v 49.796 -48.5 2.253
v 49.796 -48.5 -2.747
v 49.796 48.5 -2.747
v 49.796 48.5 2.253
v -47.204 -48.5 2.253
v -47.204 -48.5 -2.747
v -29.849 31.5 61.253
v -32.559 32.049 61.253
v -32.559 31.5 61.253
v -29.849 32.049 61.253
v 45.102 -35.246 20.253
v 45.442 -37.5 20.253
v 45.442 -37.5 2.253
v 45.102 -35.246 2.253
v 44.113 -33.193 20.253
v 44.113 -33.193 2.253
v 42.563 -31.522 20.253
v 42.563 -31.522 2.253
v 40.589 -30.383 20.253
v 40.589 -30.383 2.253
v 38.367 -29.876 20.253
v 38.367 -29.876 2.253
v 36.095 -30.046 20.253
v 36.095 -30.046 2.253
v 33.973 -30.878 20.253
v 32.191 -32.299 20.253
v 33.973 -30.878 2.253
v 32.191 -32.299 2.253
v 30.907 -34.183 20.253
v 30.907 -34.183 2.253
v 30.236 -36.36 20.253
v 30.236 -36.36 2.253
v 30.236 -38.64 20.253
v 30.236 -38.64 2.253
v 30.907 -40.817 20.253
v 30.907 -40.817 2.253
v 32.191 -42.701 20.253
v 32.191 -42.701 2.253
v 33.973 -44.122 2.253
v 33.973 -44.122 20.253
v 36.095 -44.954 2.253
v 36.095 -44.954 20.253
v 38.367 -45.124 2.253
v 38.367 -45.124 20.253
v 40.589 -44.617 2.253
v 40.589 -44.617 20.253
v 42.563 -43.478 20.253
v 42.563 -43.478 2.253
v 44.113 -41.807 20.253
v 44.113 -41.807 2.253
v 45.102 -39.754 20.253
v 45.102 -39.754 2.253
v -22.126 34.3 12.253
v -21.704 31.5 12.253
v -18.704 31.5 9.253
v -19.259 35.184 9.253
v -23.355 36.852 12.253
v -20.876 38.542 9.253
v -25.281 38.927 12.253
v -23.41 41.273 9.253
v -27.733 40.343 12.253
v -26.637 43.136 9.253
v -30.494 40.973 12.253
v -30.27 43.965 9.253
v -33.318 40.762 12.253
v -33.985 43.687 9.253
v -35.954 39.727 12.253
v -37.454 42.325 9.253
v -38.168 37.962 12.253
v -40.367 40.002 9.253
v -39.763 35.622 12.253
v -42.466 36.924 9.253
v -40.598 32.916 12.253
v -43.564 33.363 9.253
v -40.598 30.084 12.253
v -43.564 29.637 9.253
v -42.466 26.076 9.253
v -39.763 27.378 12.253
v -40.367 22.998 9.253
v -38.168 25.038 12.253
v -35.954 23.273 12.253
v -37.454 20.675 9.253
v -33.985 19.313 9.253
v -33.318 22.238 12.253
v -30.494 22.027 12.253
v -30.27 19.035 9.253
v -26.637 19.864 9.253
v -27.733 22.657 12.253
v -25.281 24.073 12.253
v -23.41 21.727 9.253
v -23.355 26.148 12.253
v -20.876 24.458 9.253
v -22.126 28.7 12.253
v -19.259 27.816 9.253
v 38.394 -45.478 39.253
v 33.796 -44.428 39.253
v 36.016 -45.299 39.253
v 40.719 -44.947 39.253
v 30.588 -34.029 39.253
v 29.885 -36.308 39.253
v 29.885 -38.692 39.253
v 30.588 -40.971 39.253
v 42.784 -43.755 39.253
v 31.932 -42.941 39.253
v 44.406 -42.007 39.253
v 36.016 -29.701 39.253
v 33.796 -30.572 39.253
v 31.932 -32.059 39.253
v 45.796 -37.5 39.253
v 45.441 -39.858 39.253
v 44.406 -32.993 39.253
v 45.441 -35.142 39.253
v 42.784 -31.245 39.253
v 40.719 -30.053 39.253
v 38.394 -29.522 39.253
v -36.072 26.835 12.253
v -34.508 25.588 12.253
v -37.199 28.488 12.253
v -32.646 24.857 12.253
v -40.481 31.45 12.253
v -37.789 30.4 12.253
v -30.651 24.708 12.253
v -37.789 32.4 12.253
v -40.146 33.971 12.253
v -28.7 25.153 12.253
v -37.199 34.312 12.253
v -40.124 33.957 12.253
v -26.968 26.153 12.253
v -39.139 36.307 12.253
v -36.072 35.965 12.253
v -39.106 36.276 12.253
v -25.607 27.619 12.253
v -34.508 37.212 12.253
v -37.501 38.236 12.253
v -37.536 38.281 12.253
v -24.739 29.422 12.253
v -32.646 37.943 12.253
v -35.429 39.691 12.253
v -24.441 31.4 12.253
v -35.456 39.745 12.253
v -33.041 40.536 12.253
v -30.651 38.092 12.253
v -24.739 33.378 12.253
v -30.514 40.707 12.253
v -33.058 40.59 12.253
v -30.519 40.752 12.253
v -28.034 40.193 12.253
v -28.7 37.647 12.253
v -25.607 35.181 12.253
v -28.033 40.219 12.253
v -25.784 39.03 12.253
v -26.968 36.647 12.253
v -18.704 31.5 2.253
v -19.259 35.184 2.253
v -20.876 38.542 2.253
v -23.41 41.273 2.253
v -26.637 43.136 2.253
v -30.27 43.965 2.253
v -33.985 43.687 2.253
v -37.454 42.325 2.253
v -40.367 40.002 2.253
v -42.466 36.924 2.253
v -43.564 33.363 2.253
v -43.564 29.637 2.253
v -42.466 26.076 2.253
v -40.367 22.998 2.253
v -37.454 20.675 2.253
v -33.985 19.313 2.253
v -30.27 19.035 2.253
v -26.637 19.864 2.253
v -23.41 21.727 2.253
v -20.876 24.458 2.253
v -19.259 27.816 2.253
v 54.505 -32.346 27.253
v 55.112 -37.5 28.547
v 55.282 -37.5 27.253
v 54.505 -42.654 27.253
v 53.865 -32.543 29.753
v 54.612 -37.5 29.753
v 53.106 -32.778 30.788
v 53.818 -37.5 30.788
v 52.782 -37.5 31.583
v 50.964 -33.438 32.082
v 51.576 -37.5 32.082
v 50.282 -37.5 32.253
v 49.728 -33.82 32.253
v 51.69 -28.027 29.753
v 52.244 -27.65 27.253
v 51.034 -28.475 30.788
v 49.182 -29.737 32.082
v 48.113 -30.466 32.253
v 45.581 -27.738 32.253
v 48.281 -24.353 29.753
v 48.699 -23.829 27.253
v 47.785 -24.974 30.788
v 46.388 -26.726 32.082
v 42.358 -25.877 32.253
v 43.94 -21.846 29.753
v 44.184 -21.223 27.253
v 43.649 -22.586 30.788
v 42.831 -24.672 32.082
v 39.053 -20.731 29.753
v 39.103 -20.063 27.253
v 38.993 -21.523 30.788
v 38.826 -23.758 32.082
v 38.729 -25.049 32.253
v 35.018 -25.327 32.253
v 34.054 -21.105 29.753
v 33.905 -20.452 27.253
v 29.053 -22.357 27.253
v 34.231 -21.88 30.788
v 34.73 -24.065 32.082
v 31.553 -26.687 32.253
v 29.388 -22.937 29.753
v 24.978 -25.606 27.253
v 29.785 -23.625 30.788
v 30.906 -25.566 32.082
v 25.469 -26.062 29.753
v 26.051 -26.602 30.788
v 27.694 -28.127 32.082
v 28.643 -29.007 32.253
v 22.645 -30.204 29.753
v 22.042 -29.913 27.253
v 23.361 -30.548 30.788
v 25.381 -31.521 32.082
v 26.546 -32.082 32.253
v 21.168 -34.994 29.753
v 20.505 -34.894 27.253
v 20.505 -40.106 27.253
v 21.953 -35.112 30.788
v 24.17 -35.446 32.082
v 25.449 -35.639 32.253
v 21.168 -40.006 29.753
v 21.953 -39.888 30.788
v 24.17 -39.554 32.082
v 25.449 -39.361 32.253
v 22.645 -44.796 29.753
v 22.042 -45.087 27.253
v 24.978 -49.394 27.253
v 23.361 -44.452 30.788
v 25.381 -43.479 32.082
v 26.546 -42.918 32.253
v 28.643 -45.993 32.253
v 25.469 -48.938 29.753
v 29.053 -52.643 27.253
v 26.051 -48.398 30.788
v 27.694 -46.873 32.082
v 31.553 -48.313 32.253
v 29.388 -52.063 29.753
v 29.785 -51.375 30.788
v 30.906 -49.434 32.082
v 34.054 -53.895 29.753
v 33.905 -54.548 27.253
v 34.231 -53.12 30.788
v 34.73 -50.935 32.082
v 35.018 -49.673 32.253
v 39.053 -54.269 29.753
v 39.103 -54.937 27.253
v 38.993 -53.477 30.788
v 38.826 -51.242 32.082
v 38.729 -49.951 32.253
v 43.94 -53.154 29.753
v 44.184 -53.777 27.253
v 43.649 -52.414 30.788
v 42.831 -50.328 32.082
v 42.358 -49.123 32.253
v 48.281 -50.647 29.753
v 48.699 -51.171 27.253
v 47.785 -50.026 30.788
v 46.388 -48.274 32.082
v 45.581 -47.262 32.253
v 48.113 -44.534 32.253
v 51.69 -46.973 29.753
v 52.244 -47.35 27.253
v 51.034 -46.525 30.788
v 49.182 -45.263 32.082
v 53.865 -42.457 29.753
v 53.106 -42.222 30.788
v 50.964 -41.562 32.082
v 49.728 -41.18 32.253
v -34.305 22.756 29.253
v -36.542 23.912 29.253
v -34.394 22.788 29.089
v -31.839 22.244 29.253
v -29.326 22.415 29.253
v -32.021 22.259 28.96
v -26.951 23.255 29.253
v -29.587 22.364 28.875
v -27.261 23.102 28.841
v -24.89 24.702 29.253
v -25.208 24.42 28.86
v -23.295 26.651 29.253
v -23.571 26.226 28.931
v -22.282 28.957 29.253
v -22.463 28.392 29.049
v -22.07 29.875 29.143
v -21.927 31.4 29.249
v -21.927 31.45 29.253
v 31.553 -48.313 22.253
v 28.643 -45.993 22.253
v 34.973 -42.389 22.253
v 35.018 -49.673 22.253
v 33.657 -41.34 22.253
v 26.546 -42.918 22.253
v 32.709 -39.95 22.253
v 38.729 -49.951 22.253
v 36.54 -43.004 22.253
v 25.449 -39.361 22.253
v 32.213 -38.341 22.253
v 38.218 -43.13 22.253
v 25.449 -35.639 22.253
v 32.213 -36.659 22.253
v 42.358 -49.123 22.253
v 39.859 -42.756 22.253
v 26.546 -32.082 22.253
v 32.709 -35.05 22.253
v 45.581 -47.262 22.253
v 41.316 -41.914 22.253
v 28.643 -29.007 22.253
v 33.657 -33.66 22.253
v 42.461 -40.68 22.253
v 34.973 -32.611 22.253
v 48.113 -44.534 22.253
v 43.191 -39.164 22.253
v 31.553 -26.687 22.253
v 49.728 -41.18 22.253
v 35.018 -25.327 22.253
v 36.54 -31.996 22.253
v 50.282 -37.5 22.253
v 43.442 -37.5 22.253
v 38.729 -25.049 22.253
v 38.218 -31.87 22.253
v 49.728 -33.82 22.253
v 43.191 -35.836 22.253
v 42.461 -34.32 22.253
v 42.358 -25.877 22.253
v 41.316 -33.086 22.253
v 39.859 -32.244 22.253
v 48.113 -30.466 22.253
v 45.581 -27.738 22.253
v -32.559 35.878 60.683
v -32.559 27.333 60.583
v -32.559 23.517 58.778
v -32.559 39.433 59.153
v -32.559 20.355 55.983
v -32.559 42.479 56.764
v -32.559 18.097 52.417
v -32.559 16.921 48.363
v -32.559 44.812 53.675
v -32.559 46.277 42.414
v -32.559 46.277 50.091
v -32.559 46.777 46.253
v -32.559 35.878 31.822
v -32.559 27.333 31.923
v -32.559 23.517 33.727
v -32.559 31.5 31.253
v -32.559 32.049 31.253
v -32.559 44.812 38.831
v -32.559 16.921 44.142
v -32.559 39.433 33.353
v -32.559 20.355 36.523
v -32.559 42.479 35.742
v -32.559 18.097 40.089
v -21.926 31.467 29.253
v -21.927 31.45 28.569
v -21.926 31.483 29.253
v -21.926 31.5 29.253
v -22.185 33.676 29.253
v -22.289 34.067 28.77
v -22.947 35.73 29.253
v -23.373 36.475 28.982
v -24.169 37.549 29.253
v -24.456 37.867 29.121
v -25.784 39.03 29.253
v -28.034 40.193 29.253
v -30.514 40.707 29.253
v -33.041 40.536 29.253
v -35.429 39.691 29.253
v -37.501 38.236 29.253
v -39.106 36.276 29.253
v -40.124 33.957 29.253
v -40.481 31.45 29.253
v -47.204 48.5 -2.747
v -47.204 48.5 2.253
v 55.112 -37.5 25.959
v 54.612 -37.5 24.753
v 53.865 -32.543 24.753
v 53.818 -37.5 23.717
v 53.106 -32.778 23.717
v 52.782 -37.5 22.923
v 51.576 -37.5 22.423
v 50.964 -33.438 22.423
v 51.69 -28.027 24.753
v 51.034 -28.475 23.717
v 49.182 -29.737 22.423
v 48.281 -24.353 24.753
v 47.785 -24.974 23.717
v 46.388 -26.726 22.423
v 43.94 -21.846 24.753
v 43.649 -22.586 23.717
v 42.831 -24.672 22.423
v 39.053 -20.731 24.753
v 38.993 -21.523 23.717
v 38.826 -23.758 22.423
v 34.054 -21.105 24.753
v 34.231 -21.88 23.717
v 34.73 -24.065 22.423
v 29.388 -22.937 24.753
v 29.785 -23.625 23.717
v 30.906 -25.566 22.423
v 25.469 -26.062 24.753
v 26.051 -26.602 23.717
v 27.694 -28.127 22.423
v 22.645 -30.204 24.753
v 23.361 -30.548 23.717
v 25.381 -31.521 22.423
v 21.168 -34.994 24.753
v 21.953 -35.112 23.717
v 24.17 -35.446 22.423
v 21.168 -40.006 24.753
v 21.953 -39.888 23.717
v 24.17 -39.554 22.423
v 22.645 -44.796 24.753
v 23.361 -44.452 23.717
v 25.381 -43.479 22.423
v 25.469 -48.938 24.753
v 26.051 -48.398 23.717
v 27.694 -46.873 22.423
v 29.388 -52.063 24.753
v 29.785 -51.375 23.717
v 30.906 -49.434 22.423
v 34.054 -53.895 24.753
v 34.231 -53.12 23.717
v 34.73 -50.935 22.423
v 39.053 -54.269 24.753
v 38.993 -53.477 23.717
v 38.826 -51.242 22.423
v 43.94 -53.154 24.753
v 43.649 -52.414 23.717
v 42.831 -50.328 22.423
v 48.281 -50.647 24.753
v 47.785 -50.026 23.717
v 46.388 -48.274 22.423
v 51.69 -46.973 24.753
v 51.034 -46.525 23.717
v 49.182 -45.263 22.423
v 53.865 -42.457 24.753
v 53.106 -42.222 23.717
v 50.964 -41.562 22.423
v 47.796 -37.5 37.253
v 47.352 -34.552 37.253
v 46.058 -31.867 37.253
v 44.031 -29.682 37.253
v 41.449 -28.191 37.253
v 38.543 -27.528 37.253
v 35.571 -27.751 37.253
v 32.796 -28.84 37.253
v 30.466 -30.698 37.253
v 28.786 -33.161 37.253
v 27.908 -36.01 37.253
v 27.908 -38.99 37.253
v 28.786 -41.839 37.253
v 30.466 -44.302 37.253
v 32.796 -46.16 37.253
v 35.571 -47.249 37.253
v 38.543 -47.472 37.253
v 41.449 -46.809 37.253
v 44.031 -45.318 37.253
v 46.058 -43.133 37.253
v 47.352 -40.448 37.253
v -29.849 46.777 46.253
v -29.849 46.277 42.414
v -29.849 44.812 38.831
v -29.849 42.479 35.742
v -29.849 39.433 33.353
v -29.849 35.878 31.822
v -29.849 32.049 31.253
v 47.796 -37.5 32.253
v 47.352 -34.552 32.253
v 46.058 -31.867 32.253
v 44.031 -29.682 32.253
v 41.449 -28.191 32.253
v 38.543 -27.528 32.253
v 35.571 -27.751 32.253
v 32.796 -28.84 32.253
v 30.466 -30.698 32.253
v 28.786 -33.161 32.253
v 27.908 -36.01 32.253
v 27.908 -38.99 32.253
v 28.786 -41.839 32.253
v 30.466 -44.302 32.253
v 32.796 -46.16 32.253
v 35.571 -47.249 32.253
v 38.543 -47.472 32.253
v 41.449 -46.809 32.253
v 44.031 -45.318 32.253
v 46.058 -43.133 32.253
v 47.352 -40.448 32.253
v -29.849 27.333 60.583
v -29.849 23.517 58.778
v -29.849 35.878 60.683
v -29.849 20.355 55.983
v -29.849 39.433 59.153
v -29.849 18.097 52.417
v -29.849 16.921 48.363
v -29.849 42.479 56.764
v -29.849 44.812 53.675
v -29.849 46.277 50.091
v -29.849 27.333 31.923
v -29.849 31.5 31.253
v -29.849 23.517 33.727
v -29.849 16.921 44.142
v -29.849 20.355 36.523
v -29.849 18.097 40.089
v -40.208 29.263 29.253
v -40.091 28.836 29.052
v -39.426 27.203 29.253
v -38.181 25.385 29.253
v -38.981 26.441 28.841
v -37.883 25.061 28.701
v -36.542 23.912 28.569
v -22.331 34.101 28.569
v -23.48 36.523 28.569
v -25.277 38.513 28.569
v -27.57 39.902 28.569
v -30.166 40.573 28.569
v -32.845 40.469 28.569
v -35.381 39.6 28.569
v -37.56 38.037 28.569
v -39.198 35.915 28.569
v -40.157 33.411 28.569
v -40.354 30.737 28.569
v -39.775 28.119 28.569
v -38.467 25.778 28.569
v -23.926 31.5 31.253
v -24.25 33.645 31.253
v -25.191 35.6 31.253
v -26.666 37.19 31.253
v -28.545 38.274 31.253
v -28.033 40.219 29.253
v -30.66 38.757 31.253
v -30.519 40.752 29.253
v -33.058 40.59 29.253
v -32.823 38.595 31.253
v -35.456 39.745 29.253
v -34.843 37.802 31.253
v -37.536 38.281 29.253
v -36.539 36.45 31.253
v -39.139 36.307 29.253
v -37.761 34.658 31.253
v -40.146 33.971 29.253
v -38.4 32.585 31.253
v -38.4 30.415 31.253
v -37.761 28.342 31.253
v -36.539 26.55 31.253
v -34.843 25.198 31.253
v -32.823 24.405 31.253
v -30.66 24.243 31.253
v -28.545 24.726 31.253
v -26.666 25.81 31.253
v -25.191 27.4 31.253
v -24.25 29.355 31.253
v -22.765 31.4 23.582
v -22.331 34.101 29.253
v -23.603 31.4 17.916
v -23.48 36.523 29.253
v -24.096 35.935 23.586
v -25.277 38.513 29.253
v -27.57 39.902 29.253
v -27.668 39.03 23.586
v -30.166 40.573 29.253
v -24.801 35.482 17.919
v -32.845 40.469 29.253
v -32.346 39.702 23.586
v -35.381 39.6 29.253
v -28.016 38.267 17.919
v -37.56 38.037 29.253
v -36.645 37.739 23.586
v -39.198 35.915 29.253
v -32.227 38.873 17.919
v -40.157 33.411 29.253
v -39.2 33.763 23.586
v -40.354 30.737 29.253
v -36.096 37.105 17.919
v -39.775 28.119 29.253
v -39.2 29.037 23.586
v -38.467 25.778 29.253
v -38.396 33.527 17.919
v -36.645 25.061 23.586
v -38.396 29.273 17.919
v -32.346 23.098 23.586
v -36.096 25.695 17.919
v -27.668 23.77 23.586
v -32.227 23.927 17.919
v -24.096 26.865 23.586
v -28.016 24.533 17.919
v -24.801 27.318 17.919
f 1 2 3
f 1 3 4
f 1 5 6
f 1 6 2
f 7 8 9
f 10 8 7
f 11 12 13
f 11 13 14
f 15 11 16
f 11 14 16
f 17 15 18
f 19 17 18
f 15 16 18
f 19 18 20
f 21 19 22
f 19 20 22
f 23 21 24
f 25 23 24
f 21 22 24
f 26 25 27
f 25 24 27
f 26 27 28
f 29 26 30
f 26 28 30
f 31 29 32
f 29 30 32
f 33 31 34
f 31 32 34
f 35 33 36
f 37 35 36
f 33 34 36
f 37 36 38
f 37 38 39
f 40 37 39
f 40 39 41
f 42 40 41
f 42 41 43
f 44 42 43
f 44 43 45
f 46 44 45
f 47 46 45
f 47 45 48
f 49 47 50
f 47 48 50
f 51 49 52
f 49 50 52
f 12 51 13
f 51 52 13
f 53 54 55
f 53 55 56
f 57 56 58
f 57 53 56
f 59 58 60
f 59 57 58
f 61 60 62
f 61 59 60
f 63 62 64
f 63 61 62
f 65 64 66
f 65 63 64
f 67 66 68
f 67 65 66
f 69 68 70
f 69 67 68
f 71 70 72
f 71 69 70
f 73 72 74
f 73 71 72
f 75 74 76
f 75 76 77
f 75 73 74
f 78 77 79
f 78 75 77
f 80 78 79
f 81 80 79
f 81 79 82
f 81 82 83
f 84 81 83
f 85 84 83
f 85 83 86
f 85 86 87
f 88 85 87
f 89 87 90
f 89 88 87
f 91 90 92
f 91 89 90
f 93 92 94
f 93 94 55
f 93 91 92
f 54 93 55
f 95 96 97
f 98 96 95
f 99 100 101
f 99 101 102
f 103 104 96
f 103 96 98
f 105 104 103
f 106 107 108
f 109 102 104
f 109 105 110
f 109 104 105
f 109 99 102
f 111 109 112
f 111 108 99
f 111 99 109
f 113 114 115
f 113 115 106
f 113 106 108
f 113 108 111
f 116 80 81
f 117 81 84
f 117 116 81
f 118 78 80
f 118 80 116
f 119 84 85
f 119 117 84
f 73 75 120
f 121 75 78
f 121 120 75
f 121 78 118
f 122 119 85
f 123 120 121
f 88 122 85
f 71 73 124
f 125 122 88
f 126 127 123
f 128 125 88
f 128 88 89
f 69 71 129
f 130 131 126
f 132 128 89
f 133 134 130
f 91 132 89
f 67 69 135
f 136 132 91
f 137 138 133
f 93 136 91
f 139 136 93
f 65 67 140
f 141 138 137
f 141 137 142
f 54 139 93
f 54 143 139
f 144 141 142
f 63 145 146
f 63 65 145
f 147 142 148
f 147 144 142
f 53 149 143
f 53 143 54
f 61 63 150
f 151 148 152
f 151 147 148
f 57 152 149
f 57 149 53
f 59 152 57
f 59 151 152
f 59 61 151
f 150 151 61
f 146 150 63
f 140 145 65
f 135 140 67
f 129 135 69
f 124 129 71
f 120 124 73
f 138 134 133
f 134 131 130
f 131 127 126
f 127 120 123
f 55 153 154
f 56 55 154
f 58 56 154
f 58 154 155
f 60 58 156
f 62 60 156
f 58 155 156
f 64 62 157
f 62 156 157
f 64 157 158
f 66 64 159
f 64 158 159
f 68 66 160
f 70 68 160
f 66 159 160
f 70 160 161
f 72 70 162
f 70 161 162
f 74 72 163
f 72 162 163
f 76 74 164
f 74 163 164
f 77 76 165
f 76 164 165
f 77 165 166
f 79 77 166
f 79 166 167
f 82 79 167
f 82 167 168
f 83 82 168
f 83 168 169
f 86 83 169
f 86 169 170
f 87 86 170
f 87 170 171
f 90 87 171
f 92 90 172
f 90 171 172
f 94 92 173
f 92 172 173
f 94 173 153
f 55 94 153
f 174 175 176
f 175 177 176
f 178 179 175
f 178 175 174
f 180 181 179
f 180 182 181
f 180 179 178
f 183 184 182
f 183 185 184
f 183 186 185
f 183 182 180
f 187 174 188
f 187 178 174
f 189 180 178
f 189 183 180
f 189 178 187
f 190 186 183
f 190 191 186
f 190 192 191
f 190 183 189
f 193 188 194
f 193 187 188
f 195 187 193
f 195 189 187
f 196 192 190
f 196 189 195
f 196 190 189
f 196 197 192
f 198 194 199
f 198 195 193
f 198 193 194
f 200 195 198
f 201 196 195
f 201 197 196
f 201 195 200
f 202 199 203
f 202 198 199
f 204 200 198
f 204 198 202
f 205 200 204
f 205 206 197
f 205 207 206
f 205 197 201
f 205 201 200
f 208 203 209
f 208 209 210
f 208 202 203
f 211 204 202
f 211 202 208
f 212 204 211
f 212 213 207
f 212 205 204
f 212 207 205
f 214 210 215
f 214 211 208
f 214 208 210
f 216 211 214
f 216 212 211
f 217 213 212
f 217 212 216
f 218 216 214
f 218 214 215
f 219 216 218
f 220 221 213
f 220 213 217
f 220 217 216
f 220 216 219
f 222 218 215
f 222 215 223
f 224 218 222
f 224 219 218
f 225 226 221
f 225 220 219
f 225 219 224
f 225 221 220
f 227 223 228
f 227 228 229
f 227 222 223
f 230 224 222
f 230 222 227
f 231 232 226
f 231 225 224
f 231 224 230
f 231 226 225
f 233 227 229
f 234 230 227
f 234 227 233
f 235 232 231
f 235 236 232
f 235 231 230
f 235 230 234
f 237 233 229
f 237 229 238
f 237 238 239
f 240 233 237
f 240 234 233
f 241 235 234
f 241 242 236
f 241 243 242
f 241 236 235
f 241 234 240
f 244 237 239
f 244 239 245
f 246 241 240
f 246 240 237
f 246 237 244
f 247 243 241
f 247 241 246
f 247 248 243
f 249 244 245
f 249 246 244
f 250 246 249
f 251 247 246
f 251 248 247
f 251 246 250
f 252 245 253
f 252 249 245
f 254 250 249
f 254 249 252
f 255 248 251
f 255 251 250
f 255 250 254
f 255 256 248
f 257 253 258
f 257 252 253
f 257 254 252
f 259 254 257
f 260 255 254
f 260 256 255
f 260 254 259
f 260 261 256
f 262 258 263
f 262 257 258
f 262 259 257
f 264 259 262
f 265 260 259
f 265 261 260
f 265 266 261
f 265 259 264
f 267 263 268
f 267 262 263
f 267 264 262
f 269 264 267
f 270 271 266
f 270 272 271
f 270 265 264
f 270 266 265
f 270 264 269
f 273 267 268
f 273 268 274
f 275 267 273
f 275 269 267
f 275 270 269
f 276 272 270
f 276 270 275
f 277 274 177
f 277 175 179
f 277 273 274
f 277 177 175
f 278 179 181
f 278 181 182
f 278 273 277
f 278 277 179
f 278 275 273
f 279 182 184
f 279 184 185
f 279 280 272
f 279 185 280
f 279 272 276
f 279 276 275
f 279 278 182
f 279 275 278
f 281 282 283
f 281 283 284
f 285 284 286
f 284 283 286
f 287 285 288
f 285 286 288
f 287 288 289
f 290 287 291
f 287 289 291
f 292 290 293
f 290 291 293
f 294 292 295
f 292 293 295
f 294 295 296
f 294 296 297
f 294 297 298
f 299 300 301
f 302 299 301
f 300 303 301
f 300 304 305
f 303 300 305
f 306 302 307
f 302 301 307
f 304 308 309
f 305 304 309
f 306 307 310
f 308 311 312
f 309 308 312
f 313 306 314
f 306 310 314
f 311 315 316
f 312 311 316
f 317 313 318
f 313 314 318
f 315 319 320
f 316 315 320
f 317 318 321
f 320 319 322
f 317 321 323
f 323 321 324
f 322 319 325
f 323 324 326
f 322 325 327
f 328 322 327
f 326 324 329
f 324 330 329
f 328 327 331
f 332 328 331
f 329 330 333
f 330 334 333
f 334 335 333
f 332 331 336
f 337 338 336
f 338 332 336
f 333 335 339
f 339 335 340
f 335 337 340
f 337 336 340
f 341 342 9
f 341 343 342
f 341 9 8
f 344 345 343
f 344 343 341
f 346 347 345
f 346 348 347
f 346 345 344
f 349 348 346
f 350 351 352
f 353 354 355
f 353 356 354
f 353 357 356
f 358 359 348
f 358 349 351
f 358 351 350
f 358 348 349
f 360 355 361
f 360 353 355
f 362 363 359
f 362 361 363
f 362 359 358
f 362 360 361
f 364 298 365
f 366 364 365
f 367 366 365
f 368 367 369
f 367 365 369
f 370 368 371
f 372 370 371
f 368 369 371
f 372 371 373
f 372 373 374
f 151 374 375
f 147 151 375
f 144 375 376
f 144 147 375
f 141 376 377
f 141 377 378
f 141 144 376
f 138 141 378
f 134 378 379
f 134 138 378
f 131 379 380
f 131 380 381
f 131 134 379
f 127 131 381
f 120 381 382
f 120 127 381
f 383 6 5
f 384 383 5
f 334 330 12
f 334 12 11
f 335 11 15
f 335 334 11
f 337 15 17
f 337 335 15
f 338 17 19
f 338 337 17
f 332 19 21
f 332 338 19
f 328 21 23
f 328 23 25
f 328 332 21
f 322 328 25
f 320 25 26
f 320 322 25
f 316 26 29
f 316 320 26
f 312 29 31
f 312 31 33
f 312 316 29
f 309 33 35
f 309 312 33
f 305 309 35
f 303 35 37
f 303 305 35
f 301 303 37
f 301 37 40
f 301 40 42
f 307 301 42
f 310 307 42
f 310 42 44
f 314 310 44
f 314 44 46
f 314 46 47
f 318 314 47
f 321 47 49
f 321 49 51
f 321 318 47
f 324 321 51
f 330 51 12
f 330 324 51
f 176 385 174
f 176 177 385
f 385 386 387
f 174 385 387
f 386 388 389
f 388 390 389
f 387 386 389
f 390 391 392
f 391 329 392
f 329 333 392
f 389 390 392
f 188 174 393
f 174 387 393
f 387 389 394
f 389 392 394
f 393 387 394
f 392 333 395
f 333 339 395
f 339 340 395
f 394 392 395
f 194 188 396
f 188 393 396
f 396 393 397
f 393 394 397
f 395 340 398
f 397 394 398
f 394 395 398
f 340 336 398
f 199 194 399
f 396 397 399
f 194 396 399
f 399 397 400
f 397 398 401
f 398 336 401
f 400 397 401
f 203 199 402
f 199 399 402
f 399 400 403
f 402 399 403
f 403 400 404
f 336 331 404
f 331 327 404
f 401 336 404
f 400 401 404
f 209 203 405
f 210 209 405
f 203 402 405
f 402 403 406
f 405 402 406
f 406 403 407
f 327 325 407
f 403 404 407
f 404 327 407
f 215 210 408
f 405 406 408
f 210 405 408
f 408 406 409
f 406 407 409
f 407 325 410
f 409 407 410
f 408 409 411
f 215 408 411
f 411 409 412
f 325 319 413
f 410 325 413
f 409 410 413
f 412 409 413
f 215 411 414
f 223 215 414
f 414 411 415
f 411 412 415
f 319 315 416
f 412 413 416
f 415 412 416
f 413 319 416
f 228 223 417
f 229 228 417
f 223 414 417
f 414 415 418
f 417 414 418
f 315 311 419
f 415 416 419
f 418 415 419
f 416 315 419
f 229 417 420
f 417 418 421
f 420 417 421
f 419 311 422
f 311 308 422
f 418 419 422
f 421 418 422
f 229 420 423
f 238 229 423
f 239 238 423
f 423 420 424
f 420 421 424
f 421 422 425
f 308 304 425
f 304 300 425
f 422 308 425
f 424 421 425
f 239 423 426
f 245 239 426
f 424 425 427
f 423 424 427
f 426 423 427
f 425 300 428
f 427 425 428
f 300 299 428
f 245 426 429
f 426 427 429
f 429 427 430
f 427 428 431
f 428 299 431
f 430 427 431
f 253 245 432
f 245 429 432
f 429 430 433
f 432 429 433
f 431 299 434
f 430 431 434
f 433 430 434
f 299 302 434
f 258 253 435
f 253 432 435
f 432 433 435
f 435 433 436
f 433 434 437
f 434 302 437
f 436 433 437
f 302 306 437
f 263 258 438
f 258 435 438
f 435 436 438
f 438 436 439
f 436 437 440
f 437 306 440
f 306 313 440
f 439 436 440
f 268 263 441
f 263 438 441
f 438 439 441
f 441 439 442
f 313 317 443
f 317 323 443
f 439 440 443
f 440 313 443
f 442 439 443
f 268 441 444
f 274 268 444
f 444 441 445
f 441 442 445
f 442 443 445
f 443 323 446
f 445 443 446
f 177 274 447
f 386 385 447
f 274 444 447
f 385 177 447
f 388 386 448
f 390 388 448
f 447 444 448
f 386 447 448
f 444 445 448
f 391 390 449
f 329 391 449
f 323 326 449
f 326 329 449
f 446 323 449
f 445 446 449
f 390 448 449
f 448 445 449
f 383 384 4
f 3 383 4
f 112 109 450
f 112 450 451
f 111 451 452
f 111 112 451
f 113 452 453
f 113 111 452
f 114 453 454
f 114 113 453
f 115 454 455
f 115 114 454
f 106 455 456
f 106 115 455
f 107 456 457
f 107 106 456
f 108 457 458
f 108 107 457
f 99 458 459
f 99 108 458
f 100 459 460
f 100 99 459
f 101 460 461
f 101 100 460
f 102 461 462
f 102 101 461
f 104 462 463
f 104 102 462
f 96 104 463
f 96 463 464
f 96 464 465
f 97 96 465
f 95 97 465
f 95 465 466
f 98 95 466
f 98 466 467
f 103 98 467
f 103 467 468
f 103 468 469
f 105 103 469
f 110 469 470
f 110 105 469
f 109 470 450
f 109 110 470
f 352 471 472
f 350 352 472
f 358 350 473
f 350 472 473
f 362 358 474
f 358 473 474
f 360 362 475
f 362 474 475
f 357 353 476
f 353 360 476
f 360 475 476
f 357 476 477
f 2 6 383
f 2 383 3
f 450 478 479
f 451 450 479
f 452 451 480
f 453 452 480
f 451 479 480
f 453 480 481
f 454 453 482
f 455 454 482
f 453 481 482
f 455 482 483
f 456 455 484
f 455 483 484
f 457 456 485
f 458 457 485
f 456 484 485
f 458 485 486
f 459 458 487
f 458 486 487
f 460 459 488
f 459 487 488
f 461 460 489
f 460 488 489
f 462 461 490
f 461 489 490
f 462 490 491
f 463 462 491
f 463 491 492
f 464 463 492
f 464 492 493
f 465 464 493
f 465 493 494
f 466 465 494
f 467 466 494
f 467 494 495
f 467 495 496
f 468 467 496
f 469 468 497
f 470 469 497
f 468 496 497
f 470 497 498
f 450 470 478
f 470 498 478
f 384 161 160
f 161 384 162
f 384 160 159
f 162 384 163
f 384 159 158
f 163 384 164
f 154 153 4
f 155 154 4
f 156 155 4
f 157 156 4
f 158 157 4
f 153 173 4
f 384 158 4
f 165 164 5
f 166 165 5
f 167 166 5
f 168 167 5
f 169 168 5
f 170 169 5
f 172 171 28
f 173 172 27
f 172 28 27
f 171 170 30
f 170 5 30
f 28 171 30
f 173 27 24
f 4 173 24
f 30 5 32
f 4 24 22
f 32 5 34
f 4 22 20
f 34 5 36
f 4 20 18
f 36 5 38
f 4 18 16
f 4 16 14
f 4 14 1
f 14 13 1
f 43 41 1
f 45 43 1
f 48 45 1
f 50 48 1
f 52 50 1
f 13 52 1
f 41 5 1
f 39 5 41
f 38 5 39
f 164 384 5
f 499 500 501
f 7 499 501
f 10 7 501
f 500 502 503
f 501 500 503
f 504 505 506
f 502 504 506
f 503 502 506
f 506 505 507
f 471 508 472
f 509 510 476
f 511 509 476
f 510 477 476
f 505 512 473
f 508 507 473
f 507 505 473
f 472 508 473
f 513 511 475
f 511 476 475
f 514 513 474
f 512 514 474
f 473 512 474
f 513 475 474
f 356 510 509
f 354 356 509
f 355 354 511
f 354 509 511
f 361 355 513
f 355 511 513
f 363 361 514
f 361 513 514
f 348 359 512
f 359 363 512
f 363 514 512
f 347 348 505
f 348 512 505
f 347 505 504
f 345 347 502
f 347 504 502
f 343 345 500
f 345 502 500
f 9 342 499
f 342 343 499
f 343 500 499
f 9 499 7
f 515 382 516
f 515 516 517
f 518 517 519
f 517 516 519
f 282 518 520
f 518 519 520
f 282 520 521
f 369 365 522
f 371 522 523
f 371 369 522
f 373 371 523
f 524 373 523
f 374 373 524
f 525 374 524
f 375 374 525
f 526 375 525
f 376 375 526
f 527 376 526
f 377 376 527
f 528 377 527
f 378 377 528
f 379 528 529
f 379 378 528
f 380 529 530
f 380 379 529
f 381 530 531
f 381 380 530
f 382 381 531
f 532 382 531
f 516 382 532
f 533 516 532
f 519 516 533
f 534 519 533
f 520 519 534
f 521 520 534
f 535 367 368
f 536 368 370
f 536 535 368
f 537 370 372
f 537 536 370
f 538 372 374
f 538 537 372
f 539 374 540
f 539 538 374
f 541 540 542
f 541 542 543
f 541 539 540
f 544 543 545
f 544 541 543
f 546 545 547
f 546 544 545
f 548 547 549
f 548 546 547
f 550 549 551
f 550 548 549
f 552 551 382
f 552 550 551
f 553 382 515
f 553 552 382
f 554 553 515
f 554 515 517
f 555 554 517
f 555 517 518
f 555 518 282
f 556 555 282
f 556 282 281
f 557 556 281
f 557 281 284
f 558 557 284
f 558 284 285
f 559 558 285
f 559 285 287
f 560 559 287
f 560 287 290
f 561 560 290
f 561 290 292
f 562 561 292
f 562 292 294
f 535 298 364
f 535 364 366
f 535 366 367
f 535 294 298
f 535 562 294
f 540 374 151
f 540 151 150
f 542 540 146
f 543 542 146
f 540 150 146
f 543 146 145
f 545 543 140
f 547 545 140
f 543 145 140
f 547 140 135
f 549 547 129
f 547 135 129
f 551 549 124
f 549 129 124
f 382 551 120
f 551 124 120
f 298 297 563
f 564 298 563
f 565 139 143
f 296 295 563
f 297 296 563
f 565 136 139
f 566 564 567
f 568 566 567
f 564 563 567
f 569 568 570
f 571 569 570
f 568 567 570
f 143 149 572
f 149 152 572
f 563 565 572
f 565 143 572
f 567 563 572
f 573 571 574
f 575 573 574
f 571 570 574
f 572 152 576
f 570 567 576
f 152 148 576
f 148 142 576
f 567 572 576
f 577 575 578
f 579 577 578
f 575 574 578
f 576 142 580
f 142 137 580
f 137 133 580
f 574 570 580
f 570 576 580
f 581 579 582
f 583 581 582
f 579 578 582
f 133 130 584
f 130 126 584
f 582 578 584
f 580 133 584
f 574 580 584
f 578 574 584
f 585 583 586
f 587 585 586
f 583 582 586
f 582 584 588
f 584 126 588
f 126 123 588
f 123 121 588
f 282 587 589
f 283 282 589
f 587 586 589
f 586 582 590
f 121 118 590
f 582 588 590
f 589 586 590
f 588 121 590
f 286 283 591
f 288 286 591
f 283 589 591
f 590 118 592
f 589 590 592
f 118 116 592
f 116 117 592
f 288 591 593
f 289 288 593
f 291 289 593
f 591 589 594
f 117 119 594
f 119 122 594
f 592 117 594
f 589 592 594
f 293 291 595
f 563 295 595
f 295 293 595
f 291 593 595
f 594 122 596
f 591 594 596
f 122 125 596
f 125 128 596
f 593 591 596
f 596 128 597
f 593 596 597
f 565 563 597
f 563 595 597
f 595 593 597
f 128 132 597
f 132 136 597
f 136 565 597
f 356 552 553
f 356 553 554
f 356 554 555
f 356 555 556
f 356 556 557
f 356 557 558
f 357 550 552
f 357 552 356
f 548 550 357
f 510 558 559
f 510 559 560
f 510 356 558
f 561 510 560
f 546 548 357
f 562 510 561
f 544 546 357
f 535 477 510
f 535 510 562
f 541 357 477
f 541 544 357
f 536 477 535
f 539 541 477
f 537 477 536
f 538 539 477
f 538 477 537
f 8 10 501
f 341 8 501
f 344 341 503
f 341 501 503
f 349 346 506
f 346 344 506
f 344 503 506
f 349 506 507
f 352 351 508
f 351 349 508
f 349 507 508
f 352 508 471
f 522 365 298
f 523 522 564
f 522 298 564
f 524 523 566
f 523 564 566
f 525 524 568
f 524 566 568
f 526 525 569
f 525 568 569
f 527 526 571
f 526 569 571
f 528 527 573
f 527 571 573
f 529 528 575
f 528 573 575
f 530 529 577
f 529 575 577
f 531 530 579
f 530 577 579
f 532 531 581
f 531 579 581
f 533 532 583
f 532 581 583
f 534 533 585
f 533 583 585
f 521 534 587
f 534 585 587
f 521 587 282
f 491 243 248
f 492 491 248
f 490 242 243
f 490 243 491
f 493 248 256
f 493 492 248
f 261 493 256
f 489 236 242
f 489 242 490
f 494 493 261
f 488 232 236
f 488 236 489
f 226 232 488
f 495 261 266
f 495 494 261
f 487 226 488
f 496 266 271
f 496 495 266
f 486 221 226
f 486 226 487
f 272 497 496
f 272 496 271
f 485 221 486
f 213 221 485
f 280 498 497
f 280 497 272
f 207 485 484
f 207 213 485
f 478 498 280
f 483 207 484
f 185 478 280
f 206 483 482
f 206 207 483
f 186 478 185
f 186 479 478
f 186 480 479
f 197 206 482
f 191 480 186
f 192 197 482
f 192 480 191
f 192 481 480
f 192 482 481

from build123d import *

# Parameters (mm, degrees)
F0_W      = 97
F0_H      = 5
F1_DEPTH  = 48.5
F2_R      = 7.6458649313
F3_DEPTH  = 20
F4_SIZE   = 2
F5_R      = 17.4861306414
F6_DEPTH  = 10
F7_R      = 4.99999
F8_R      = 10
F9_DEPTH  = 7
F10_SIZE  = 2
F11_R     = 12.5
F12_DEPTH = 10
F13_SIZE  = 3
F14_R     = 9.2774942081
F15_DEPTH = 19
F16_SIZE  = 2
F17_W     = 2.7091787755
F17_H     = 30.5535356402
F18_DEPTH = 30
F20_DEPTH = 17.3555893878


# Not quite as in the source:
# - a fillet or chamfer is up to 0.001 mm smaller than in the source, because OpenCascade refuses the exact size


with BuildPart() as f1:
    # F0 (on Front) → F1 (new body, symmetric)
    with BuildSketch(Plane.XZ):
        with Locations((1.2960880995, -0.2472623394)):
            Rectangle(F0_W, F0_H)
    extrude(amount=F1_DEPTH, both=True)

    # F2 (on face) → F3 (join)
    with BuildSketch(Plane.XY.offset(2.2527376606)):
        with Locations((37.7960880995, -37.5)):
            Circle(F2_R)
    extrude(amount=F3_DEPTH)

    # F4
    f4_edges = [f1.edges().sort_by_distance(p)[0] for p in [
        (30.150223, -37.5, 22.252738),
    ]]
    chamfer(f4_edges, length=F4_SIZE)

    # F5 (on face) → F6 (join)
    with BuildSketch(Plane.XY.offset(22.2527376606)):
        with Locations((37.7960880995, -37.5)):
            Circle(F5_R)
    extrude(amount=F6_DEPTH)

    # F7 (radius 5 in the source; OpenCascade refuses exactly that, so slightly less here)
    f7_edges = [f1.edges().sort_by_distance(p)[0] for p in [
        (55.282219, -37.5, 27.252738),
        (20.309957, -37.5, 22.252738),
        (20.309957, -37.5, 32.252738),
    ]]
    fillet(f7_edges, radius=F7_R)

    # F8 (on face) → F9 (join)
    with BuildSketch(Plane.XY.offset(32.2527376606)):
        with Locations((37.7960880995, -37.5)):
            Circle(F8_R)
    extrude(amount=F9_DEPTH)

    # F10
    f10_edges = [f1.edges().sort_by_distance(p)[0] for p in [
        (27.796088, -37.5, 39.252738),
    ]]
    chamfer(f10_edges, length=F10_SIZE)

    # F11 (on face) → F12 (join)
    with BuildSketch(Plane.XY.offset(2.2527376606)):
        with Locations((-31.2039119005, 31.5)):
            Circle(F11_R)
    extrude(amount=F12_DEPTH)

    # F13
    f13_edges = [f1.edges().sort_by_distance(p)[0] for p in [
        (-43.703912, 31.5, 12.252738),
    ]]
    chamfer(f13_edges, length=F13_SIZE)

    # F14 (on face) → F15 (join)
    with BuildSketch(Plane.XY.offset(12.2527376606)):
        with Locations((-31.2039119005, 31.5)):
            Circle(F14_R)
    extrude(amount=F15_DEPTH)

    # F16
    f16_edges = [f1.edges().sort_by_distance(p)[0] for p in [
        (-40.481406, 31.5, 31.252738),
    ]]
    chamfer(f16_edges, length=F16_SIZE)

    # F17 (on face) → F18 (join)
    with BuildSketch(Plane.XY.offset(31.2527376606)):
        with Locations((-31.2039119005, 31.5)):
            Rectangle(F17_W, F17_H)
    extrude(amount=F18_DEPTH)

    # F19 (on face) → F20 (cut, through all)
    with BuildSketch(Plane.YZ.offset(-29.8493225127)):
        with BuildLine():
            Line((46.7767678201, 61.2527376606), (32.0485214627, 61.2527376606))
            ThreePointArc((32.0485214627, 61.2527376606), (42.4791618872, 56.763699091), (46.7767678201, 46.2527376606))
            Line((46.7767678201, 46.2527376606), (46.7767678201, 61.2527376606))
        make_face()
        with BuildLine():
            ThreePointArc((31.5, 31.2527376606), (16.7717536426, 46.2527376606), (31.5, 61.2527376606))
            Line((31.5, 61.2527376606), (16.2232321799, 61.2527376606))
            Line((16.2232321799, 61.2527376606), (16.2232321799, 31.2527376606))
            Line((16.2232321799, 31.2527376606), (24.3496846545, 31.2527376606))
            Line((24.3496846545, 31.2527376606), (31.5, 31.2527376606))
        make_face()
        with BuildLine():
            ThreePointArc((46.7767678201, 46.2527376606), (42.4791618872, 35.7417762302), (32.0485214627, 31.2527376606))
            Line((32.0485214627, 31.2527376606), (38.6503153455, 31.2527376606))
            Line((38.6503153455, 31.2527376606), (46.7767678201, 31.2527376606))
            Line((46.7767678201, 31.2527376606), (46.7767678201, 46.2527376606))
        make_face()
    extrude(amount=-F20_DEPTH, mode=Mode.SUBTRACT)

    # F22 (on offset) → F23 (revolve, cut)
    with BuildSketch(Plane.XZ.offset(-31.4)):
        Polygon((-21.9264176924, 12.2527376606), (-21.9264176924, 29.2527376606), (-24.4411546737, 12.2527376606), align=None)
        Polygon((-37.9155091941, 12.2527376606), (-40.4814061086, 29.2527376606), (-40.4814061086, 12.2527376606), align=None)
    revolve(axis=Axis((-31.1523377895, 31.4, 20.637573155), (0, 0, 1)), mode=Mode.SUBTRACT)


solid = f1.part
